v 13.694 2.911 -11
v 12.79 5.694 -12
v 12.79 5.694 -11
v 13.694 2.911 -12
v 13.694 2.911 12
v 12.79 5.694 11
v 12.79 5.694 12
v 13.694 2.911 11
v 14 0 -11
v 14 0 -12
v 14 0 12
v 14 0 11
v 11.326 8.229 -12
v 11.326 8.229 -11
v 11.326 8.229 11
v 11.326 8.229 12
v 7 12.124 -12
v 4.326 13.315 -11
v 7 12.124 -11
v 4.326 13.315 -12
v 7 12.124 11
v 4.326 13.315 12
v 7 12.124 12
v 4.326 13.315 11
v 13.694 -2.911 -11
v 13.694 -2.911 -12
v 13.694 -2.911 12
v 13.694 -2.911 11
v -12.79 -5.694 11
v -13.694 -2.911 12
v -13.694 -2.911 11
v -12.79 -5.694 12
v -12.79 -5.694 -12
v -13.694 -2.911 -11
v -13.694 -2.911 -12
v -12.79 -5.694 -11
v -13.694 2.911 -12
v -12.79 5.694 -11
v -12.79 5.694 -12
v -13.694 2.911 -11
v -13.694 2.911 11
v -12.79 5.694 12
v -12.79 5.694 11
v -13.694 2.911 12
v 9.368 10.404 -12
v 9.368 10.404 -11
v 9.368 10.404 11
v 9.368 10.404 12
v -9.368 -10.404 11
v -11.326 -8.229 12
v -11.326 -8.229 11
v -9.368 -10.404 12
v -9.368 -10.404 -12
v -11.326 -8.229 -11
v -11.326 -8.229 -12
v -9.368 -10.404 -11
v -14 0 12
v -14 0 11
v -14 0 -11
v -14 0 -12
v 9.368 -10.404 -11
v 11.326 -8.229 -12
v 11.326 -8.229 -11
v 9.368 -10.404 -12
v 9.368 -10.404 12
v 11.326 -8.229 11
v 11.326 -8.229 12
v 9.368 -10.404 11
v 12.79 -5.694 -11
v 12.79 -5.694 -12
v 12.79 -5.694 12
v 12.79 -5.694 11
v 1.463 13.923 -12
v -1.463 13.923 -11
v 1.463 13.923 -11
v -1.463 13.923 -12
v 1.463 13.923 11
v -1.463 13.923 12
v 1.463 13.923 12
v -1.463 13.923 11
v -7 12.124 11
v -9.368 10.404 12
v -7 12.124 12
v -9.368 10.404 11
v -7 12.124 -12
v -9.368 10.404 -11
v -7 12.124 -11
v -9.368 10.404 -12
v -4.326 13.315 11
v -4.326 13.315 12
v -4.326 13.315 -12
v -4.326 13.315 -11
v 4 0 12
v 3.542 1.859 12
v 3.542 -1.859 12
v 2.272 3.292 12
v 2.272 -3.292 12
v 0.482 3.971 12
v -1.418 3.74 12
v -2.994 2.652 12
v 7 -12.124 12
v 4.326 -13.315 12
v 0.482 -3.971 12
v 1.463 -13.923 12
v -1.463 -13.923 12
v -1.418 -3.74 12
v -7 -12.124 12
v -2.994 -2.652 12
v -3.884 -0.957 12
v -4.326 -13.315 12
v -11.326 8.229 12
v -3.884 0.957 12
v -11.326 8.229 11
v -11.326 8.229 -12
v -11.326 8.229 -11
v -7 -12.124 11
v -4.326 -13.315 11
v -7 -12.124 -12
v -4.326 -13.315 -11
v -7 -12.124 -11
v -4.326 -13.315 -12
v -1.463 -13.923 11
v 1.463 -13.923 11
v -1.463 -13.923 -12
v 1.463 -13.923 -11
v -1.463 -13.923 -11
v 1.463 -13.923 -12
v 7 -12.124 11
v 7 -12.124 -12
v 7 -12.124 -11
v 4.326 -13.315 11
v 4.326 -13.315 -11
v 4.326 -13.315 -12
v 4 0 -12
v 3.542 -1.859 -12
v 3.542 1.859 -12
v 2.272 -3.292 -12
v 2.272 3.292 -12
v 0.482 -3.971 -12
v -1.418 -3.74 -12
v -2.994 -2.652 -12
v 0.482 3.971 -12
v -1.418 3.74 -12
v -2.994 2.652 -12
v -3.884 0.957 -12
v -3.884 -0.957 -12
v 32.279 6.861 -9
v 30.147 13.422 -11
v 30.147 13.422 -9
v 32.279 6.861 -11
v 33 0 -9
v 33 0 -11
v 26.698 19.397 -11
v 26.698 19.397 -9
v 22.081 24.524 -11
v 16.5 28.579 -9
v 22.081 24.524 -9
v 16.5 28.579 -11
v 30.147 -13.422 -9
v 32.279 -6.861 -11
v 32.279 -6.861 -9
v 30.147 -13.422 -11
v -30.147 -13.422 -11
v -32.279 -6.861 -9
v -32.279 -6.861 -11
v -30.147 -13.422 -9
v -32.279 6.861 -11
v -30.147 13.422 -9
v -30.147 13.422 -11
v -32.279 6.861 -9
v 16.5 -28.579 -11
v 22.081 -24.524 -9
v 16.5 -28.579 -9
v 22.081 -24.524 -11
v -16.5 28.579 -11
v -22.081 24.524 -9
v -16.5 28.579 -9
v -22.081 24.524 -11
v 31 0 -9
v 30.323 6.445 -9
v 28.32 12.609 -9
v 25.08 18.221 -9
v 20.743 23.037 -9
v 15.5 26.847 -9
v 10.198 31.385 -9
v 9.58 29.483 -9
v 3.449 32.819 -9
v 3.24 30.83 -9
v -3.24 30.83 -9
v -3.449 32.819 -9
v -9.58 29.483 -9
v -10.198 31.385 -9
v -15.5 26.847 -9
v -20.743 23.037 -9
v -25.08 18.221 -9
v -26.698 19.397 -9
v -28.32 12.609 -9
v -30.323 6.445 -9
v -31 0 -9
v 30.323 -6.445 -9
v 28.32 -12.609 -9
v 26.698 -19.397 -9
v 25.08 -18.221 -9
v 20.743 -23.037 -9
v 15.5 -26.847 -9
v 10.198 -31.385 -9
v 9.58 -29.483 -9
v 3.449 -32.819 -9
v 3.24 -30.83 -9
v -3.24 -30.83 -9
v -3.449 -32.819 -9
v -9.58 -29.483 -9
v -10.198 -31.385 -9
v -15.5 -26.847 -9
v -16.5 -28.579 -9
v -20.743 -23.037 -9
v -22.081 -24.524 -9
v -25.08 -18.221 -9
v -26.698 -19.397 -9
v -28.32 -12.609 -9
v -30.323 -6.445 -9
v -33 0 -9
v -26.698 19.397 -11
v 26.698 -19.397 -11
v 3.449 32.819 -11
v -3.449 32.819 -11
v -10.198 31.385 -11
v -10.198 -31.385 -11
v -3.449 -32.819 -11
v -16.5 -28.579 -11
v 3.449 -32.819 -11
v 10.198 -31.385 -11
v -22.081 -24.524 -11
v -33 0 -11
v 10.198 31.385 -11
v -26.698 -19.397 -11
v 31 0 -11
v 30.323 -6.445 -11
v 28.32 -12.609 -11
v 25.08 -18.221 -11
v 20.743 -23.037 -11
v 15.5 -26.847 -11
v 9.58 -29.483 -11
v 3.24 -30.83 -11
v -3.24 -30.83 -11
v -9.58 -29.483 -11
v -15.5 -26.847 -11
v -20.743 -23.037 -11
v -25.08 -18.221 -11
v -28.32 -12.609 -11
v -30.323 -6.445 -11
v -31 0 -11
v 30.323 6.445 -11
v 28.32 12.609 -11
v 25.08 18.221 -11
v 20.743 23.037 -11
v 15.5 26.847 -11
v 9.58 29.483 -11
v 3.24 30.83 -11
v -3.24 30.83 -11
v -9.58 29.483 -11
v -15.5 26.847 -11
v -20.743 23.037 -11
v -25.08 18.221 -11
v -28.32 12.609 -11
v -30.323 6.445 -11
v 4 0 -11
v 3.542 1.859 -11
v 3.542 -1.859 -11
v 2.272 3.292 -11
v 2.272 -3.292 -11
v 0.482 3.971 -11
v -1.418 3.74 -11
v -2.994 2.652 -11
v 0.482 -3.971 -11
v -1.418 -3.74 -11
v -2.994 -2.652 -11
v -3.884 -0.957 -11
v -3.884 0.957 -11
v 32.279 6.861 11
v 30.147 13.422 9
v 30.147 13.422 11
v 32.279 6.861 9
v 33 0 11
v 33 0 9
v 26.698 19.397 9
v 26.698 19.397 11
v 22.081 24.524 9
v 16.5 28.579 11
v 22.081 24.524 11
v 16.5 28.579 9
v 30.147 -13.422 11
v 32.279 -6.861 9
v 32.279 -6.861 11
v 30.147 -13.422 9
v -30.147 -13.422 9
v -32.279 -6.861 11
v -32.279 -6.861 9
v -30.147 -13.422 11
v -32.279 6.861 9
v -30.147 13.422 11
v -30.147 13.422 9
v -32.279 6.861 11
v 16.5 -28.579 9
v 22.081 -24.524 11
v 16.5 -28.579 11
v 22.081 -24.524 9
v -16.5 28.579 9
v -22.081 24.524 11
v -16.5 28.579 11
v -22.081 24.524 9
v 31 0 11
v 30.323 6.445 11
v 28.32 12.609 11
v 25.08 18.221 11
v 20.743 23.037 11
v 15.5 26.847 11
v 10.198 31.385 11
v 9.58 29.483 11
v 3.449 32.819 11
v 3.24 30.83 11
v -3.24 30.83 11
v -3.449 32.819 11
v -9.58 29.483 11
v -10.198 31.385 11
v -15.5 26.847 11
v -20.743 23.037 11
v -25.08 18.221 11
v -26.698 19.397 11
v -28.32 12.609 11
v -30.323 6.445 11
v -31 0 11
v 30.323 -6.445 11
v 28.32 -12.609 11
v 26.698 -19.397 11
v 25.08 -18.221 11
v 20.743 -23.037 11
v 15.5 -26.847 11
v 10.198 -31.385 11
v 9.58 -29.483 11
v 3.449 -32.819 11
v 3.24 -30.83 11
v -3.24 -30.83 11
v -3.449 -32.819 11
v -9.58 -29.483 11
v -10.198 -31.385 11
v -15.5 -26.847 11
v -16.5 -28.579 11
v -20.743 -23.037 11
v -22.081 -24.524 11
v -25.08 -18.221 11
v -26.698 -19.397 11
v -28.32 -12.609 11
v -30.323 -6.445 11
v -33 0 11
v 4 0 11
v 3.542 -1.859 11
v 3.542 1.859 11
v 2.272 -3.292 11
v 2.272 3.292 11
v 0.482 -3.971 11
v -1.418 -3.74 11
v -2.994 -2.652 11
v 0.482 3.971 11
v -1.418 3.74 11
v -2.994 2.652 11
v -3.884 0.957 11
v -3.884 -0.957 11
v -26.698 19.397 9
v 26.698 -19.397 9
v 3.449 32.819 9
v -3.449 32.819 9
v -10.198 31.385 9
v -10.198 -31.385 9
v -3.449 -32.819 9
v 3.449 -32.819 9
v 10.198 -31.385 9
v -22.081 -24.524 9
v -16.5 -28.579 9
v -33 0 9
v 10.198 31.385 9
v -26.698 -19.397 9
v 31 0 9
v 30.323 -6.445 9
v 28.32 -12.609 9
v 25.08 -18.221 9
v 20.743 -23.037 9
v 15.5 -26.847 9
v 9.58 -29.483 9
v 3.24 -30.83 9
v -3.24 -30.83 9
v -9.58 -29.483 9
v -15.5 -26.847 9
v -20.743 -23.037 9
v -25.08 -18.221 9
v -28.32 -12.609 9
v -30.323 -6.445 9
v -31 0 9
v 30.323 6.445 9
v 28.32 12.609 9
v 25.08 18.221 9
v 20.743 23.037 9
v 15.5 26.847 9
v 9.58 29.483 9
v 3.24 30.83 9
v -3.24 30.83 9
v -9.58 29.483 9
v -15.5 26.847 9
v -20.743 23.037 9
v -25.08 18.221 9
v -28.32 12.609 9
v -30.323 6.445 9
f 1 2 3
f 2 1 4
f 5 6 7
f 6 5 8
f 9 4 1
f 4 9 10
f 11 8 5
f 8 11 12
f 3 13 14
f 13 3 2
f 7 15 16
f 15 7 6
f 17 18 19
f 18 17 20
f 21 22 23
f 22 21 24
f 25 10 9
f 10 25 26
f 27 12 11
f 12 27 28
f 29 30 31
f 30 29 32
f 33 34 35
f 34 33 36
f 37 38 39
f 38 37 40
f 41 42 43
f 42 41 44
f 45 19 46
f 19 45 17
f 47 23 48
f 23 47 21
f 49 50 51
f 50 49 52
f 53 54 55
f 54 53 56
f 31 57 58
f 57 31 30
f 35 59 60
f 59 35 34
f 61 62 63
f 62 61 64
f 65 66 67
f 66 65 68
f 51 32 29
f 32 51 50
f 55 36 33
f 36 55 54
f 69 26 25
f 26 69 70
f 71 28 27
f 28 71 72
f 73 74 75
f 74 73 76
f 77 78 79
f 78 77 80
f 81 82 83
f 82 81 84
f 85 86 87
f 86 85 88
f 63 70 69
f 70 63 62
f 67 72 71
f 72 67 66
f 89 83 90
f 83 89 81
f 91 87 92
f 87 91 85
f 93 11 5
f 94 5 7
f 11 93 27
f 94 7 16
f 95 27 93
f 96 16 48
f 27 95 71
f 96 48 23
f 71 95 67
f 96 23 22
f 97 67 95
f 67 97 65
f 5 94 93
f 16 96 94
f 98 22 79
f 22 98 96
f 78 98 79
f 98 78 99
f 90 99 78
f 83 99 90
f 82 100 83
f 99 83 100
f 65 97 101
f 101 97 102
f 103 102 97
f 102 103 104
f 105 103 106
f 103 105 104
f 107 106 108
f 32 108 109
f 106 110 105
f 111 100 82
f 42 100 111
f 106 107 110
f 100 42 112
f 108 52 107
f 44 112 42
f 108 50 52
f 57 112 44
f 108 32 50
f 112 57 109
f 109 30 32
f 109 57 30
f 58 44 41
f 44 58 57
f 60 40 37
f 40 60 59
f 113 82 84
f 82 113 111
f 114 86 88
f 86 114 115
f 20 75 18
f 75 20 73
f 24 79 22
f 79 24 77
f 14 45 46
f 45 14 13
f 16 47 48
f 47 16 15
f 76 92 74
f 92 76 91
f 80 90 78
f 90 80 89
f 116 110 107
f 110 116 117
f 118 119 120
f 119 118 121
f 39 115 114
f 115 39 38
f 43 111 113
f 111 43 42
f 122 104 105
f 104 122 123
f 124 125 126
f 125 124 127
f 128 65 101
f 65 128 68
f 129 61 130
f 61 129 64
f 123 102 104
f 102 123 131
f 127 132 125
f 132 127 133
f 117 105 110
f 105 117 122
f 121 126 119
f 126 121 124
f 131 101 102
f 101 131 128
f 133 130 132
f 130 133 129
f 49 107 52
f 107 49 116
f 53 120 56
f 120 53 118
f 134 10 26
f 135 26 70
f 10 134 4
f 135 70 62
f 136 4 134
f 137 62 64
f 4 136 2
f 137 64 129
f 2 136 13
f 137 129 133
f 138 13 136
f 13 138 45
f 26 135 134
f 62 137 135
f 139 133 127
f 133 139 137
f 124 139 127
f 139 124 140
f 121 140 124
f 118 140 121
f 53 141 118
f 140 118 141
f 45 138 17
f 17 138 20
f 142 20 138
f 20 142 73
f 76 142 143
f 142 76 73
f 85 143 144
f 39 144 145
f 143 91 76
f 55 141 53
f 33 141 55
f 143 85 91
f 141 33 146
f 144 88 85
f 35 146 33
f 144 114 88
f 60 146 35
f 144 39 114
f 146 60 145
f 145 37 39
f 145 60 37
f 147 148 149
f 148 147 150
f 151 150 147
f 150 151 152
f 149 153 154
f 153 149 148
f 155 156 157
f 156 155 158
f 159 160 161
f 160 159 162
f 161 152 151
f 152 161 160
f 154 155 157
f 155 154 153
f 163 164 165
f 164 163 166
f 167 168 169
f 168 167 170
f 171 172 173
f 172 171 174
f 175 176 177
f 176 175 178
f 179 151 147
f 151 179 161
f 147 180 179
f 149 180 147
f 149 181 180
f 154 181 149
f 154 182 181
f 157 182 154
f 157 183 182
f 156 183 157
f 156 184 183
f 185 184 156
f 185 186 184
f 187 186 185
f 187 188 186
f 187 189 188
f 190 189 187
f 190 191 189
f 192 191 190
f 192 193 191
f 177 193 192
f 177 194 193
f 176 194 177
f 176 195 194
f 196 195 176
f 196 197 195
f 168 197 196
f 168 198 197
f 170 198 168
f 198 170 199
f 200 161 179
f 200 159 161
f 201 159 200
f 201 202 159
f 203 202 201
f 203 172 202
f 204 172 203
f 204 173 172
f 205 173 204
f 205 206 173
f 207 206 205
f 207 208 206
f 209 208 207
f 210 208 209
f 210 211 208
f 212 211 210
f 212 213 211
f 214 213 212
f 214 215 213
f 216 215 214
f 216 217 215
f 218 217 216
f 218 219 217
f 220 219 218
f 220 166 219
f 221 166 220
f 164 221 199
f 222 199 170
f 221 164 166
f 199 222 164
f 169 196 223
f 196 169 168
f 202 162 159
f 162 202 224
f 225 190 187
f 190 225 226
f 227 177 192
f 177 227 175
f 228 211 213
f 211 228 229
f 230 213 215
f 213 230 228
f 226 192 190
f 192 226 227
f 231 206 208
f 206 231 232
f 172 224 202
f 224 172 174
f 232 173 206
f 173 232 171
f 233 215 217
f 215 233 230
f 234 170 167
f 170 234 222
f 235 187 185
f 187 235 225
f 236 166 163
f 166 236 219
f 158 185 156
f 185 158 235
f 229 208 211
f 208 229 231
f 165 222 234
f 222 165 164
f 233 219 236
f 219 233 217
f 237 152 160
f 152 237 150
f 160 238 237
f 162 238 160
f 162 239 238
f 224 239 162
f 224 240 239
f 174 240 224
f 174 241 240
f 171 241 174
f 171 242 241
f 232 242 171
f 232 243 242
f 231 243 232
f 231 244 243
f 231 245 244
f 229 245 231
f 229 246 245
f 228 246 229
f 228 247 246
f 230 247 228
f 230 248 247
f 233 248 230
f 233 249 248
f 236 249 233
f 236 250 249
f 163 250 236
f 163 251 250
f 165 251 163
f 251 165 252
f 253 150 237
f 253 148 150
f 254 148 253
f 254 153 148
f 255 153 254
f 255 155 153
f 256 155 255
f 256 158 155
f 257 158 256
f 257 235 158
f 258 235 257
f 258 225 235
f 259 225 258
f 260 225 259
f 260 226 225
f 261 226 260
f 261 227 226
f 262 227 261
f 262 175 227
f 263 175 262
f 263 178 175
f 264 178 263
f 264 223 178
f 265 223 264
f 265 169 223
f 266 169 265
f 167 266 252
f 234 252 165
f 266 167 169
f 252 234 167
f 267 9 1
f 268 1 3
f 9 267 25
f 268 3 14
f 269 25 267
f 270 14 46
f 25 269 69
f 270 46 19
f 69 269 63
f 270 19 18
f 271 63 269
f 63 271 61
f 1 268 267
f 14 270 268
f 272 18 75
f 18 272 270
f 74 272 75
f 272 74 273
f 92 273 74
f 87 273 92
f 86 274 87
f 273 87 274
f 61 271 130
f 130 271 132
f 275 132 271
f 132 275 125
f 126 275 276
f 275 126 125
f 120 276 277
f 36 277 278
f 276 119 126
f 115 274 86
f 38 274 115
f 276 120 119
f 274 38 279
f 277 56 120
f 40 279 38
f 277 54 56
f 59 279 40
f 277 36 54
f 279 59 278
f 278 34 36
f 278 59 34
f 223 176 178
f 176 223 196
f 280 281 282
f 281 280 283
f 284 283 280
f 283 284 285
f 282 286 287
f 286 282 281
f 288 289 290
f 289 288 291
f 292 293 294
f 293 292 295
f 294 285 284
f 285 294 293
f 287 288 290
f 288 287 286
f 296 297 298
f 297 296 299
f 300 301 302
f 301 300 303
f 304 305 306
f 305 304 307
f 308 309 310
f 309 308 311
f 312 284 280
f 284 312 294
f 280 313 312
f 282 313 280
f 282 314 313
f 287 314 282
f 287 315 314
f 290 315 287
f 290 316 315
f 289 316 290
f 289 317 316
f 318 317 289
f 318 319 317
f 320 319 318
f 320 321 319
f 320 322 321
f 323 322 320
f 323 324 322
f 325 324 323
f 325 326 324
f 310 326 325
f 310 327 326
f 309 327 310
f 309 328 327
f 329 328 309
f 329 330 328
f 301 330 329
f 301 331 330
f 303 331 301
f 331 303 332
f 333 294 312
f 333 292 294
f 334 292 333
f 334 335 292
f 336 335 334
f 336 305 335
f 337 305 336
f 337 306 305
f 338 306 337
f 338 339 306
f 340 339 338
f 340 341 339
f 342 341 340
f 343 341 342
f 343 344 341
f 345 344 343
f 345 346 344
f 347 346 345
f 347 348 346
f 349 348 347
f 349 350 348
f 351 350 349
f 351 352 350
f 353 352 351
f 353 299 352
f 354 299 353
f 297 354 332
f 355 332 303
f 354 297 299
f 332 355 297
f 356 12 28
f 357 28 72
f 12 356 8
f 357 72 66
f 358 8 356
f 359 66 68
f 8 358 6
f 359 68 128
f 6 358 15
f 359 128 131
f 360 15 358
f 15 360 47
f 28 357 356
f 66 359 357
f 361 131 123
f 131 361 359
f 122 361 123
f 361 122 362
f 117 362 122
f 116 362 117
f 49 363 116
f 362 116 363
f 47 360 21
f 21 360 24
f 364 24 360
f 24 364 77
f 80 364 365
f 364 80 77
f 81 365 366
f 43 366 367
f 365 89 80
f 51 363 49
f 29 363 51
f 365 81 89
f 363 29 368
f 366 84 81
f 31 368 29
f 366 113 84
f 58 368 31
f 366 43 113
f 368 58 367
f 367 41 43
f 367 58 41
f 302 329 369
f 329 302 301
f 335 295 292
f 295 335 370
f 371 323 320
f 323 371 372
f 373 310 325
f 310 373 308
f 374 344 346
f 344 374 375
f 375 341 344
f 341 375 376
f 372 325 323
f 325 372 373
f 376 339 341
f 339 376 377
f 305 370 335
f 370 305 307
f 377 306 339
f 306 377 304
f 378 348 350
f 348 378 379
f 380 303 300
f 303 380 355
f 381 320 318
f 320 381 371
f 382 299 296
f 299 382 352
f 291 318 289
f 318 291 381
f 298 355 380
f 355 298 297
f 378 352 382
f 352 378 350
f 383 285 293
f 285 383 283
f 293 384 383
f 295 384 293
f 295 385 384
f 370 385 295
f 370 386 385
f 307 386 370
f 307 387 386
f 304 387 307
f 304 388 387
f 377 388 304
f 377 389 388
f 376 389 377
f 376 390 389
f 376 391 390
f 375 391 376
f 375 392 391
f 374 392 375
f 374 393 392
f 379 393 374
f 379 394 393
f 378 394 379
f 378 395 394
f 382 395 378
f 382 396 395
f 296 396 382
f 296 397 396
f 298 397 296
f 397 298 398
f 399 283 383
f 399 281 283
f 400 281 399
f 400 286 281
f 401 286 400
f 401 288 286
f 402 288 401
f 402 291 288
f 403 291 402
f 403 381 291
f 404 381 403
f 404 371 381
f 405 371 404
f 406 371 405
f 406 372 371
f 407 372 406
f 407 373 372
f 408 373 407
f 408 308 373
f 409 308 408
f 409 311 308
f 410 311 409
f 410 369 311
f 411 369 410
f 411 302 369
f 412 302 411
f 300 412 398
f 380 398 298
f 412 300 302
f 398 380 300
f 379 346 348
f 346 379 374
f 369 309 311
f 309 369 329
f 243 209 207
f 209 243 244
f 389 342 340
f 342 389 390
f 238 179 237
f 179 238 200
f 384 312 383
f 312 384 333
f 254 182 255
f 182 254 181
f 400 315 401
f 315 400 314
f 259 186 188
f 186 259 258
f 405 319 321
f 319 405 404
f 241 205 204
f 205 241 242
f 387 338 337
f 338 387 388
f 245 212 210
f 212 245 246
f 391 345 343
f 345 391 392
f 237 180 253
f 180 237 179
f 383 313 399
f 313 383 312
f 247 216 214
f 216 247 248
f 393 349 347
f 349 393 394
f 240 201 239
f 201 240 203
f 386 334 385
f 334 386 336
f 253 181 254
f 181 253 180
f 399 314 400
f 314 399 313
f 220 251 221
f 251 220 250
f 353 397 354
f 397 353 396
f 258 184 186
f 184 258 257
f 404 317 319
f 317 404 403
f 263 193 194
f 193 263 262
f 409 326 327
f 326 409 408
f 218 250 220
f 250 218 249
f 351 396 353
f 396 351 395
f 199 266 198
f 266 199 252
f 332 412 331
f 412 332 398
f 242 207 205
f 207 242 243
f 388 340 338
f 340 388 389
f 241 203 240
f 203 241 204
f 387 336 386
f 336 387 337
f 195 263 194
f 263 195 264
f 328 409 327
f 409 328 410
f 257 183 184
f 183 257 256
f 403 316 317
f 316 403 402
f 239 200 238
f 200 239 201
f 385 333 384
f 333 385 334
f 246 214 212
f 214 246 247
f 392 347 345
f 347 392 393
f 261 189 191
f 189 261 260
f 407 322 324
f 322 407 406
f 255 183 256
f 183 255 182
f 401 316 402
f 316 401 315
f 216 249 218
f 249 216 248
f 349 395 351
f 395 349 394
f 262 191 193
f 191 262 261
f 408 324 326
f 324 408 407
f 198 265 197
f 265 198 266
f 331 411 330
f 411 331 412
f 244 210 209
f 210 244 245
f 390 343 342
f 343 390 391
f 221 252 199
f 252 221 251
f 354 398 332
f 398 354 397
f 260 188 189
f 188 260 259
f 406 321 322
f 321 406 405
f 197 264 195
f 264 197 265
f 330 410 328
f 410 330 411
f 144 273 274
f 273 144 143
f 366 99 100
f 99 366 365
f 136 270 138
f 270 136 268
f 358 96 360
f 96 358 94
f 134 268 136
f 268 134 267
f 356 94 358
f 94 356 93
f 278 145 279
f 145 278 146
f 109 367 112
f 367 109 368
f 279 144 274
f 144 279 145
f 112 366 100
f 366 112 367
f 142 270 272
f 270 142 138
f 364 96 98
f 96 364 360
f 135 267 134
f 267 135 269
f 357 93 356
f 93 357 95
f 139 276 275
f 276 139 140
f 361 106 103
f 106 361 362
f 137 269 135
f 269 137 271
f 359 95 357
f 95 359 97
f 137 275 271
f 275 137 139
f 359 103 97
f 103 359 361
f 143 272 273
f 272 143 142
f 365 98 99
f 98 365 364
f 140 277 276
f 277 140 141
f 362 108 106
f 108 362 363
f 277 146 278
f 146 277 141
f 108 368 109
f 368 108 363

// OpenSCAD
// Parameters
pulley_od = 60; //[30:120:1]
pulley_width = 20; //[10:40:1]
rim_thickness = 6; //[3:12:1]
hub_od = 28; //[14:56:1]
hub_length = 24; //[12:48:1]
bore_d = 8; //[4:20:0.5]
groove_type = 1; //[0:1:1]
groove_angle = 40; //[20:60:1]
groove_depth = 4; //[1:10:0.5]
flange_od = 66; //[33:132:1]
flange_thickness = 2; //[1:6:0.5]
set_screw_d = 3; //[2:6:0.5]
set_screw_offset_z = 0; //[-10:10:0.5]
keyway_w = 3; //[1.5:8:0.5]
keyway_h = 1.5; //[0.75:4:0.25]
keyway_length = 18; //[9:36:1]
spoke_count = 4; //[3:8:1]
spoke_width = 6; //[3:14:0.5]
spoke_thickness = 8; //[4:20:0.5]
lightening_hole_d = 8; //[4:20:0.5]
lightening_hole_count = 6; //[3:12:1]
crown_height = 0.6; //[0:2:0.1]
edge_relief = 0.8; //[0:2:0.1]
overlap = 1; //[0.5:2:0.1]

// Base Shapes
module pulley_body() {
  cylinder(r=pulley_od/2, h=pulley_width, center=true);
}

module hub() {
  cylinder(r=hub_od/2, h=hub_length, center=true);
}

module rim_inner_void() {
  cylinder(r=pulley_od/2 - rim_thickness, h=pulley_width + 2*overlap, center=true);
}

module through_bore() {
  cylinder(r=bore_d/2, h=hub_length + 2*overlap, center=true);
}

module flange_left() {
  translate([0, 0, -pulley_width/2 - flange_thickness/2 + overlap])
    cylinder(r=flange_od/2, h=flange_thickness, center=true);
}

module flange_right() {
  translate([0, 0, pulley_width/2 + flange_thickness/2 - overlap])
    cylinder(r=flange_od/2, h=flange_thickness, center=true);
}

module belt_groove_profile() {
  cylinder(r1=pulley_od/2, r2=pulley_od/2 - groove_depth, h=pulley_width + 2*overlap, center=true);
}

module set_screw_hole() {
  rotate([0, 90, 0])
    translate([0, 0, set_screw_offset_z])
      cylinder(r=set_screw_d/2, h=hub_od + 2*overlap, center=true);
}

module keyway() {
  translate([0, bore_d/2 - keyway_h/2 + overlap, 0])
    cube([keyway_w, keyway_h, keyway_length], center=true);
}

module spoke() {
  cube([pulley_od/2 - rim_thickness - hub_od/2 + 2*overlap, spoke_width, spoke_thickness], center=true);
}

module lightening_hole() {
  rotate([90, 0, 0])
    cylinder(r=lightening_hole_d/2, h=pulley_width + 2*overlap, center=true);
}

module crown_profile() {
  cylinder(r=pulley_od/2 + overlap, h=pulley_width + 2*overlap, center=true);
}

module edge_relief_left() {
  translate([0, 0, -pulley_width/2 + edge_relief - overlap])
    cylinder(r1=pulley_od/2 + overlap, r2=pulley_od/2 - edge_relief, h=edge_relief*2, center=true);
}

module edge_relief_right() {
  translate([0, 0, pulley_width/2 - edge_relief + overlap])
    rotate([180, 0, 0])
      cylinder(r1=pulley_od/2 + overlap, r2=pulley_od/2 - edge_relief, h=edge_relief*2, center=true);
}

// Operations
module rim() {
  difference() {
    pulley_body();
    rim_inner_void();
  }
}

module spokes() {
  union() {
    for (i = [0:spoke_count-1]) {
      rotate([0, 0, i*360/spoke_count])
        translate([(hub_od/2 + (pulley_od/2 - rim_thickness))/2, 0, 0])
          spoke();
    }
  }
}

module pulley_solid_pre_cuts() {
  union() {
    rim();
    hub();
    spokes();
    flange_left();
    flange_right();
  }
}

module fillets_chamfers() {
  difference() {
    pulley_solid_pre_cuts();
    edge_relief_left();
    edge_relief_right();
  }
}

module pulley_with_belt_profile() {
  difference() {
    fillets_chamfers();
    belt_groove_profile();
  }
}

module pulley_with_crown() {
  difference() {
    pulley_with_belt_profile();
    crown_profile();
  }
}

module pulley_with_holes() {
  difference() {
    pulley_with_crown();
    through_bore();
    set_screw_hole();
    keyway();
    for (i = [0:lightening_hole_count-1]) {
      rotate([0, 0, i*360/lightening_hole_count])
        translate([(hub_od/2 + (pulley_od/2 - rim_thickness))/2, 0, 0])
          lightening_hole();
    }
  }
}

// Final Output
color("Silver") pulley_with_holes();
